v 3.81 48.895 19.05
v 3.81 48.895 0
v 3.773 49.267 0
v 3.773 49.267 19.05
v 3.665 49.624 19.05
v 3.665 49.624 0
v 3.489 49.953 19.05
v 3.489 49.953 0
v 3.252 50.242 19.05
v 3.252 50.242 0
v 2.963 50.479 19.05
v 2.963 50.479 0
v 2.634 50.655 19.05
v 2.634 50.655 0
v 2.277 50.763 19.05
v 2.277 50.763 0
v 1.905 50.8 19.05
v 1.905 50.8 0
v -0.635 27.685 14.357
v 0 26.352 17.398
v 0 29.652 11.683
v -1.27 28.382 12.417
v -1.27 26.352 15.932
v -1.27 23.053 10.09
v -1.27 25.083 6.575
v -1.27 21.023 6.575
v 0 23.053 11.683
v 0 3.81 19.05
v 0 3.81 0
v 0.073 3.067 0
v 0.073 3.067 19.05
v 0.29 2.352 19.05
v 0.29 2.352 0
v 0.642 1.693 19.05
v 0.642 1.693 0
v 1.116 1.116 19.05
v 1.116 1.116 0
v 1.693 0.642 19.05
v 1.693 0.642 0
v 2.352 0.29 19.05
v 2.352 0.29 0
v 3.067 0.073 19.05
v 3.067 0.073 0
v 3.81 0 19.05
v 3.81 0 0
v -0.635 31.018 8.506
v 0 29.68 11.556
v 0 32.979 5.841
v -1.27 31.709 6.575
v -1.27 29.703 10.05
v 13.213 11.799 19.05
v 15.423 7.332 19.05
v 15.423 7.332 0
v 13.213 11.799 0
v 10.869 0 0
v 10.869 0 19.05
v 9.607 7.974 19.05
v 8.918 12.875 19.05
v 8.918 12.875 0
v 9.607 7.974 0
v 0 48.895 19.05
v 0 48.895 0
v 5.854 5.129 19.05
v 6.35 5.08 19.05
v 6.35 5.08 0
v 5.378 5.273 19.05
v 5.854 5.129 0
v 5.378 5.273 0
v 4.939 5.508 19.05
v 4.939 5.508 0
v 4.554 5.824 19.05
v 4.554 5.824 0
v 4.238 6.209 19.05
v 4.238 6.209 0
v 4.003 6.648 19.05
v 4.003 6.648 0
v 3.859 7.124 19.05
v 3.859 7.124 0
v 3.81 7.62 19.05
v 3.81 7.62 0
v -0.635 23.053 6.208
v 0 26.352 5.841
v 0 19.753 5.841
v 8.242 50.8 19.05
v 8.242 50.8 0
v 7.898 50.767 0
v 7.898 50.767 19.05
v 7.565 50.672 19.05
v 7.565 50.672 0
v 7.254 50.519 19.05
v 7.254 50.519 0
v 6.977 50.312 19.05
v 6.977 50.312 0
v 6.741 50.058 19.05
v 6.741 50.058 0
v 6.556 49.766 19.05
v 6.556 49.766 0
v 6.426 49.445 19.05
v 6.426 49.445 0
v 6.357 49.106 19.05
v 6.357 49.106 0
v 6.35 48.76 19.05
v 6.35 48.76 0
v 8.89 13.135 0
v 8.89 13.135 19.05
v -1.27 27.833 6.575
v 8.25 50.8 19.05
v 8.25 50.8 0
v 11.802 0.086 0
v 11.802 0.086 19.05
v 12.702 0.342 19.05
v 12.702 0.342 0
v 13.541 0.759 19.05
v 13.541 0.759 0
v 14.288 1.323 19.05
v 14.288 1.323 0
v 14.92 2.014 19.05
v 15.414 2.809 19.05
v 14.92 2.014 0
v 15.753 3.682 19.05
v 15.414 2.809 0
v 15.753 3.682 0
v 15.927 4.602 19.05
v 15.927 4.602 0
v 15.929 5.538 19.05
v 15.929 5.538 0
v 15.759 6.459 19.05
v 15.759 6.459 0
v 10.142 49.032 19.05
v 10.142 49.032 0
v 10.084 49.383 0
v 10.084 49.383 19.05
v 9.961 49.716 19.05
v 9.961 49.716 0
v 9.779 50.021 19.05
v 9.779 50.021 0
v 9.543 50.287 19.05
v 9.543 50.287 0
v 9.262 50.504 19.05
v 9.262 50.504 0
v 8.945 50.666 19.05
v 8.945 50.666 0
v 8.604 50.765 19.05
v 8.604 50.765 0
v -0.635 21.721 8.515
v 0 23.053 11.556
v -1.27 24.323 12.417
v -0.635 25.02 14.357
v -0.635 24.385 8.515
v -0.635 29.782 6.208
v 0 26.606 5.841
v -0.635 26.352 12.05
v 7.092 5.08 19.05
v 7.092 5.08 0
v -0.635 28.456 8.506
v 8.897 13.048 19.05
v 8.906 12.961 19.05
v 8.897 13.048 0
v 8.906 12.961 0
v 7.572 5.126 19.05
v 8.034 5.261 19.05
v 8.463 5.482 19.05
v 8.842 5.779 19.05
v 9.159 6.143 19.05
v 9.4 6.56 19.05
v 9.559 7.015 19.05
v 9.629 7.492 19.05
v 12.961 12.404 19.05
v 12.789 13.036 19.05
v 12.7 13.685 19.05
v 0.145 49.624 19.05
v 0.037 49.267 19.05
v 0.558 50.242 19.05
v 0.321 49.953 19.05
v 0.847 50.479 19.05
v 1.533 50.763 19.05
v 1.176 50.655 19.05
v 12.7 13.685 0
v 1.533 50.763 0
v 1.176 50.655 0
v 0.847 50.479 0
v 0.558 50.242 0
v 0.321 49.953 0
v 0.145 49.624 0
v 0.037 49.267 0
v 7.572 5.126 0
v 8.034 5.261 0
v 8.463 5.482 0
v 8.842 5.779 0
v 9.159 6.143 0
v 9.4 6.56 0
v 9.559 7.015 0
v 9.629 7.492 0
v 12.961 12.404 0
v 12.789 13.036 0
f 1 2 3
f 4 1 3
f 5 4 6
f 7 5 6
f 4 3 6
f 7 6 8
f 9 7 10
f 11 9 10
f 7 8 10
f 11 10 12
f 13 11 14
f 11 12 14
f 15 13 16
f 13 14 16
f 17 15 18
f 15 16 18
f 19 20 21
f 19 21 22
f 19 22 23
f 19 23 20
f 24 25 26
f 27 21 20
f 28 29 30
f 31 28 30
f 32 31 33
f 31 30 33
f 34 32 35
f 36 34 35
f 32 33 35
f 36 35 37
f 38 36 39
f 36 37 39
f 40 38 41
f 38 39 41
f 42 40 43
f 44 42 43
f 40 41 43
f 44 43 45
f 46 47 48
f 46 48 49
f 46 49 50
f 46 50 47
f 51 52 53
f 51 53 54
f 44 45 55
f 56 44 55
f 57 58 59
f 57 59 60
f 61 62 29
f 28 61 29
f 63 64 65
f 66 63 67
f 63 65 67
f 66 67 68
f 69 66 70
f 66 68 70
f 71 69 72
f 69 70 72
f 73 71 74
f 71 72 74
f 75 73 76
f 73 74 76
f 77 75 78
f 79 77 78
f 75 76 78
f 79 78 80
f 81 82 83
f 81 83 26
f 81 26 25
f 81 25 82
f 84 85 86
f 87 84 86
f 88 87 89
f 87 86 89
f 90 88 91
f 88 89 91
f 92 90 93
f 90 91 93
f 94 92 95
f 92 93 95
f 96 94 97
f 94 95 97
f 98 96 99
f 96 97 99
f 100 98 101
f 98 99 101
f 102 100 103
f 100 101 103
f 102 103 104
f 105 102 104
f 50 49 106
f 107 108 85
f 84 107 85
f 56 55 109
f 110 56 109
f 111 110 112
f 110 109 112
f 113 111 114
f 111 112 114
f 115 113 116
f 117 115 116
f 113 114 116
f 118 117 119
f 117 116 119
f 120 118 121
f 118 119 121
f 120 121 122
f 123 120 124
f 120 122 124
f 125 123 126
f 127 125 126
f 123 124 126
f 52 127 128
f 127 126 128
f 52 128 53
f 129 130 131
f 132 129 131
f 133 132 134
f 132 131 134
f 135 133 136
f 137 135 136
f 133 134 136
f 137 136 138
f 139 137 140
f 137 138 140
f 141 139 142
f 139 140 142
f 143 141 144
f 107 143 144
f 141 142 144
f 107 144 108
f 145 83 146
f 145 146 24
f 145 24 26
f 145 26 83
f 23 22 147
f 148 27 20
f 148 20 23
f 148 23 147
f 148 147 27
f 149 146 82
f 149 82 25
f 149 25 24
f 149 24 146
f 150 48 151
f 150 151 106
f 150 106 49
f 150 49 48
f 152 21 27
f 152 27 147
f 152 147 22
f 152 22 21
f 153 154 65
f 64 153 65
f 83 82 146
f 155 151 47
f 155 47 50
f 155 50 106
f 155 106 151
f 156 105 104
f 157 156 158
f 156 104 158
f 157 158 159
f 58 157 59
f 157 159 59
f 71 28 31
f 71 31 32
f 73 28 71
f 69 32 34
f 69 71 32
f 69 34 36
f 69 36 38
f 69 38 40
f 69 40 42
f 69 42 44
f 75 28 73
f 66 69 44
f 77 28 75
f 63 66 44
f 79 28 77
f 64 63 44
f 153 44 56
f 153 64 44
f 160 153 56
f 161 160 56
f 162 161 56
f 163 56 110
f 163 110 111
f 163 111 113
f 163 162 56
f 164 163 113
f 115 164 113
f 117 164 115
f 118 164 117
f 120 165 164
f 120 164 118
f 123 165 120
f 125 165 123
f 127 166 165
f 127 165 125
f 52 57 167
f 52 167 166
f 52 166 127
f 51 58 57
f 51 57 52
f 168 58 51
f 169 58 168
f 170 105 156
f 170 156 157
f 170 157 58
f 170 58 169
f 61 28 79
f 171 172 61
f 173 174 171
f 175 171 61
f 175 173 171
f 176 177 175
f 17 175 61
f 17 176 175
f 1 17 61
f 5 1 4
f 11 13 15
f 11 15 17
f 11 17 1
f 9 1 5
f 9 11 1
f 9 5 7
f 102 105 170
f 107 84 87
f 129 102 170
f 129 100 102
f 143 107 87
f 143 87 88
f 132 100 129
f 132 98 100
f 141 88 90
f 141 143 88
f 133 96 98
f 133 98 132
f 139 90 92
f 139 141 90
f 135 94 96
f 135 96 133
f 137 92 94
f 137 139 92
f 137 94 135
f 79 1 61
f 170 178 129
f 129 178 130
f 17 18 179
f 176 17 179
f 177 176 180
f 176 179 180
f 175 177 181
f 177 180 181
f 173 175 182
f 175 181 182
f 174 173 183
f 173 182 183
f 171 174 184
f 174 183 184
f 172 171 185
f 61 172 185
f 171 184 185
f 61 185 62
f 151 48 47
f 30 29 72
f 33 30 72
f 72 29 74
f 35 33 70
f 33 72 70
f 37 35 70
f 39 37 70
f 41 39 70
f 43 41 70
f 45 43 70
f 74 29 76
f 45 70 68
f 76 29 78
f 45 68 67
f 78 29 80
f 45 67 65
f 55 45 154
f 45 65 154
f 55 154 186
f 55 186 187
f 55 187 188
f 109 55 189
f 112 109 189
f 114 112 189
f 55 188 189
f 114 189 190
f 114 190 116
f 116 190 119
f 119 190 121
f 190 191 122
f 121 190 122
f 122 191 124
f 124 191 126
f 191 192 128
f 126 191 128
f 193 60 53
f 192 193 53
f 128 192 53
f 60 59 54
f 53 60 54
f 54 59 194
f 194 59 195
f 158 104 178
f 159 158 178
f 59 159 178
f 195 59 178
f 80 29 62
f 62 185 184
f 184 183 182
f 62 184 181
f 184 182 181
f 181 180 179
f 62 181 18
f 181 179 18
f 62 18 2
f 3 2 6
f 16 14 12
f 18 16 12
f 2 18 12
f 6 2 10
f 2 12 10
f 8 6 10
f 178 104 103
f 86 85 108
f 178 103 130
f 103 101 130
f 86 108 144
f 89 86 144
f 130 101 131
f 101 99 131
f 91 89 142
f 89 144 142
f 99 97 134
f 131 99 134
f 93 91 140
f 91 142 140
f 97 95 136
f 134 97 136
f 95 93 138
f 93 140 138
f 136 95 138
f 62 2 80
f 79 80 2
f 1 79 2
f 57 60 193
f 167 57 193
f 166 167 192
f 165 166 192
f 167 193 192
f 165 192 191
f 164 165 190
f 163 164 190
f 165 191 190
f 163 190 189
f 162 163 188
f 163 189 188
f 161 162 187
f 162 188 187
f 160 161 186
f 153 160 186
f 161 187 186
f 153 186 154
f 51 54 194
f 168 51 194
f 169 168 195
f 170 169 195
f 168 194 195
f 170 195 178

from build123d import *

# Parameters (mm, degrees)
F1_DEPTH = 19.05
F3_DEPTH = 1.27
F3_TAPER = 30


# Not quite as in the source:
# - ends of sketch curves that miss each other by under 0.0002 mm in the source are joined


with BuildPart() as f1:
    # F0 (on Top) → F1 (new body)
    with BuildSketch(Plane.XY):
        with BuildLine():
            Line((0, 48.895), (0, 3.81))
            ThreePointArc((0, 3.81), (1.1159231637, 1.1159231637), (3.81, 0))
            Line((3.81, 0), (10.8694752949, 0))
            ThreePointArc((10.8694752949, 0), (15.1850721495, 2.4000701897), (15.4228204366, 7.3324315794))
            Line((15.4228204366, 7.3324315794), (13.2134093055, 11.7988098401))
            ThreePointArc((13.2134093055, 11.7988098401), (12.8651563088, 12.7167993307), (12.7, 13.684636222))
            Line((12.7, 13.684636222), (10.1424057316, 49.0324769491))
            ThreePointArc((10.1424057316, 49.0324769491), (9.5427497716, 50.2871367633), (8.2501762867, 50.7999840172))
            Line((8.2501762867, 50.7999840172), (8.2423728139, 50.8))
            ThreePointArc((8.2423728139, 50.8), (6.8534050374, 50.1903975816), (6.35, 48.7595199989))
            Line((6.35, 48.7595199989), (8.89, 13.134720074))
            ThreePointArc((8.89, 13.134720074), (8.901535038, 13.0044810095), (8.9175320778, 12.8747144278))
            Line((8.9175320778, 12.8747144278), (9.607234407, 7.973977099))
            ThreePointArc((9.607234407, 7.973977099), (9.009141131, 5.9537920045), (7.092020656, 5.08))
            Line((7.092020656, 5.08), (6.35, 5.08))
            ThreePointArc((6.35, 5.08), (4.5539487758, 5.8239487758), (3.81, 7.62))
            Line((3.81, 7.62), (3.81, 48.895))
            ThreePointArc((3.81, 48.895), (3.2520384182, 50.2420384182), (1.905, 50.8))
            ThreePointArc((1.905, 50.8), (0.5579615818, 50.2420384182), (0, 48.895))
        make_face()
    extrude(amount=F1_DEPTH)


with BuildPart() as f3:
    # F2 (on face) → F3 (new body)
    with BuildSketch(Plane(origin=(0, 0, 0), x_dir=(0, -1, 0), z_dir=(-1, 0, 0))):
        Polygon((-29.6520567884, 11.6832929166), (-23.0529432116, 11.6832929166), (-26.3525, 17.3982929166), align=None)
    extrude(amount=F3_DEPTH, taper=F3_TAPER)


with BuildPart() as f3b:
    # F2 (on face) → F3, piece 2 (new body)
    with BuildSketch(Plane(origin=(0, 0, 0), x_dir=(0, -1, 0), z_dir=(-1, 0, 0))):
        Polygon((-32.9794660211, 5.8412929166), (-26.6065, 5.8412929166), (-29.6799092326, 11.5562929166), align=None)
    extrude(amount=F3_DEPTH, taper=F3_TAPER)


with BuildPart() as f3c:
    # F2 (on face) → F3, piece 3 (new body)
    with BuildSketch(Plane(origin=(0, 0, 0), x_dir=(0, -1, 0), z_dir=(-1, 0, 0))):
        Polygon((-26.3525, 5.8412929166), (-19.7533864232, 5.8412929166), (-23.0529432116, 11.5562929166), align=None)
    extrude(amount=F3_DEPTH, taper=F3_TAPER)


solid = Compound([f1.part, f3.part, f3b.part, f3c.part])
